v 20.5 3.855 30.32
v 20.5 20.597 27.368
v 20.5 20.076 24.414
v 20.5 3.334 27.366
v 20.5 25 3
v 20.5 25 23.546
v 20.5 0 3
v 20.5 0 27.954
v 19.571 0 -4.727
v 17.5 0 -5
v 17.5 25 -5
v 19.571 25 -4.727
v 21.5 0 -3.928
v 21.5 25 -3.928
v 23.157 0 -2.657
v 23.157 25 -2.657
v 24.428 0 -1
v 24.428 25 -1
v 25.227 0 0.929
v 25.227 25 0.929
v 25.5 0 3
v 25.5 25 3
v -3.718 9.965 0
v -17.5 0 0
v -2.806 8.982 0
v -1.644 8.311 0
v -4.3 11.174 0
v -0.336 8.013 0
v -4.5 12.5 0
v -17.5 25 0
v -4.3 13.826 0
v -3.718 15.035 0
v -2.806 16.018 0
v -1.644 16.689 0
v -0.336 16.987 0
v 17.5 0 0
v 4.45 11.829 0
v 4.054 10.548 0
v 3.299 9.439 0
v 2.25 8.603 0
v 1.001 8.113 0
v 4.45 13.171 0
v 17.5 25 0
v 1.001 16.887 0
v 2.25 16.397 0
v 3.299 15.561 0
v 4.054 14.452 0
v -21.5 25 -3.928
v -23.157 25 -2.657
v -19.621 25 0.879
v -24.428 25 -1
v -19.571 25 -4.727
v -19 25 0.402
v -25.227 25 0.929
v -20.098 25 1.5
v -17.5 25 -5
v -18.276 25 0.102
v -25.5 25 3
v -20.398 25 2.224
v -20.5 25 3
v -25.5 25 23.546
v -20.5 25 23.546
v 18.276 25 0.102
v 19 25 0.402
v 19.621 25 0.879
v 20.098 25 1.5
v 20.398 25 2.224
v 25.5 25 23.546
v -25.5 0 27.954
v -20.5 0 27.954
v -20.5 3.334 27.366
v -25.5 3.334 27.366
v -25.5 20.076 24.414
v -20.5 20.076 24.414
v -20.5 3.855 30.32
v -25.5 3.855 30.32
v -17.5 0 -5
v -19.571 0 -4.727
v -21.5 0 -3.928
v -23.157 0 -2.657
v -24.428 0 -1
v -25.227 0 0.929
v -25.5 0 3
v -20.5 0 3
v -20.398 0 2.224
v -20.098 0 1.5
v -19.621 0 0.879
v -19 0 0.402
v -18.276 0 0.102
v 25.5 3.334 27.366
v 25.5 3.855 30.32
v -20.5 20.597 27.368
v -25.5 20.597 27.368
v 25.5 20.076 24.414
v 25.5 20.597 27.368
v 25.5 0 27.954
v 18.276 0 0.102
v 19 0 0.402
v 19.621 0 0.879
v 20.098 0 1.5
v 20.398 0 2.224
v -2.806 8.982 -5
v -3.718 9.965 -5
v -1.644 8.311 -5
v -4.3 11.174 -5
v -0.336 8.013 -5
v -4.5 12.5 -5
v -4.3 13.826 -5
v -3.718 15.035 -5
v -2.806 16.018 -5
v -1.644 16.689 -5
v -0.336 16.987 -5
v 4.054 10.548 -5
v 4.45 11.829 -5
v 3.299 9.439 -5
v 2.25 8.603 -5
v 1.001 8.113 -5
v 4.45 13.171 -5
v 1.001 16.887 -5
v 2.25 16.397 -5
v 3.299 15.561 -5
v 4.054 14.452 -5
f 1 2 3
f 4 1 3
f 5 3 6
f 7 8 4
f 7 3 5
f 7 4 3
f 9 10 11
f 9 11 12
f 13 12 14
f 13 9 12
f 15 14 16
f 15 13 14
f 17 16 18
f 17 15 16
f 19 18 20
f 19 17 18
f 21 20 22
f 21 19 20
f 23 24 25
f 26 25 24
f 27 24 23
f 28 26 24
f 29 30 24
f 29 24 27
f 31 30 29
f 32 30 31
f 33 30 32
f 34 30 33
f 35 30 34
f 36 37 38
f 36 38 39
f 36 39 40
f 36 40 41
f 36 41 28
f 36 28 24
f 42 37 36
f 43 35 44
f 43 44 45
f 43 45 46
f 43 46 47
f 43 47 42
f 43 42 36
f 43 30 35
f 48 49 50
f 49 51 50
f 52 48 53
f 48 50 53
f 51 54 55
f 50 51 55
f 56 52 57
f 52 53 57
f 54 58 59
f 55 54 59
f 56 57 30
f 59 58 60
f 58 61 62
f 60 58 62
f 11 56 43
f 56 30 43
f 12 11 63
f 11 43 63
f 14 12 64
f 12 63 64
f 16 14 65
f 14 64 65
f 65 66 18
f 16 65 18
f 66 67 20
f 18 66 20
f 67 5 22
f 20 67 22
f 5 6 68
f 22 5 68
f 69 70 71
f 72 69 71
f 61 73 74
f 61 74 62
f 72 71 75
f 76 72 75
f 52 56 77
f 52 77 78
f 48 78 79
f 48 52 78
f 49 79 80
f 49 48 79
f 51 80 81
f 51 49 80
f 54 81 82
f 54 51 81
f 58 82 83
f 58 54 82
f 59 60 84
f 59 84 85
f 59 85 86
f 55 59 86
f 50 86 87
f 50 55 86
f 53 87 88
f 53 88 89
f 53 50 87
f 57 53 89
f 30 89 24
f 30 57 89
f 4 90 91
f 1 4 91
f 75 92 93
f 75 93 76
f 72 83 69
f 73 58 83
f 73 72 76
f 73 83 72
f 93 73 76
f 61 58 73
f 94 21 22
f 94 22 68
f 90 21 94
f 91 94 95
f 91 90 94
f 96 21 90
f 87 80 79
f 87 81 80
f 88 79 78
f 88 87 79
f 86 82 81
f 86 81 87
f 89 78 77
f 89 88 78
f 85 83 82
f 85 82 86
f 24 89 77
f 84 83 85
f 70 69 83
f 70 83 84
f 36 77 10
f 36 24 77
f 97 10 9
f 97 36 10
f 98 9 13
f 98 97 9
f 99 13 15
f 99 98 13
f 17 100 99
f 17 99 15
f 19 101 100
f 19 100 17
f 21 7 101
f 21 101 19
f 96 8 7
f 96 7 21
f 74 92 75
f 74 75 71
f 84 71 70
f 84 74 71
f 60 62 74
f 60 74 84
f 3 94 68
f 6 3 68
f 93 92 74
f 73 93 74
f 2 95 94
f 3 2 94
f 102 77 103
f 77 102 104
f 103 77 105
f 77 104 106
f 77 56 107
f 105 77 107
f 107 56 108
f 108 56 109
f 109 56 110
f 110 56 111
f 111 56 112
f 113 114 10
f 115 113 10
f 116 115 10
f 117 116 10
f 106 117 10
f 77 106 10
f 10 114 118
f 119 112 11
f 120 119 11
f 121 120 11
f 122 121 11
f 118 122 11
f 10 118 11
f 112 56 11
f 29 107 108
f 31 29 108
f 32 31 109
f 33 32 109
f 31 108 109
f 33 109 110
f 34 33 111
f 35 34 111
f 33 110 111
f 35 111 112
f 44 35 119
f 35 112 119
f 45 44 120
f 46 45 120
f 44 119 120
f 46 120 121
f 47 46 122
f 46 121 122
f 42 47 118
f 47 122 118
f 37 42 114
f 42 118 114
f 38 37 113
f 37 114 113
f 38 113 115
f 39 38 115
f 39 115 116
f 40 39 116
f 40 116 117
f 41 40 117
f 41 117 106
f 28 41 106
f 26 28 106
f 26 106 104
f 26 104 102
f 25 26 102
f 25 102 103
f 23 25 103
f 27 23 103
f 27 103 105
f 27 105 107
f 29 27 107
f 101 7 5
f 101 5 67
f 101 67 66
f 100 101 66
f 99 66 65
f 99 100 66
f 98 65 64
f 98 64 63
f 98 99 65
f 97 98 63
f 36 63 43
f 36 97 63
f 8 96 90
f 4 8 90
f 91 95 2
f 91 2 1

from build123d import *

# Parameters (mm, degrees)
SKETCH_1_W             = 35
SKETCH_1_H             = 25
SM_BASE_FLANGE_1_DEPTH = 5
SM_EDGE_FLANGE_1_DEPTH = 25
SM_EDGE_FLANGE_2_DEPTH = 25
CUT_EXTRUDE_1_DEPTH    = 65.707032075
CUT_EXTRUDE_3_DEPTH    = 65.707032075
SKETCH_35_R            = 4.5
CUT_EXTRUDE_2_DEPTH    = 51.227169575


# Sheet-metal steps are written as plain solids
with BuildPart() as part:
    # Sketch 1 → Базовая кромка1 (new body)
    with BuildSketch(Plane.XY):
        with Locations((0, 12.5)):
            Rectangle(SKETCH_1_W, SKETCH_1_H)
    extrude(amount=-SM_BASE_FLANGE_1_DEPTH)

    # Ребро-кромка1 section (across the edge) → Ребро-кромка1 (add)
    with BuildSketch(Plane(origin=(-20.5, 25, 0), x_dir=(1, 0, 0), z_dir=(0, -1, 0))):
        with BuildLine():
            Line((-5, 3), (-5, 31))
            Line((-5, 31), (0, 31))
            Line((0, 31), (0, 3))
            ThreePointArc((0, 3), (0.878679656, 0.878679656), (3, 0))
            Line((3, 0), (3, -5))
            ThreePointArc((3, -5), (-2.656854249, -2.656854249), (-5, 3))
        make_face()
    extrude(amount=SM_EDGE_FLANGE_1_DEPTH)

    # Ребро-кромка2 section (across the edge) → Ребро-кромка2 (add)
    with BuildSketch(Plane(origin=(20.5, 0, 0), x_dir=(-1, 0, 0), z_dir=(0, 1, 0))):
        with BuildLine():
            Line((-5, 3), (-5, 31))
            Line((-5, 31), (0, 31))
            Line((0, 31), (0, 3))
            ThreePointArc((0, 3), (0.878679656, 0.878679656), (3, 0))
            Line((3, 0), (3, -5))
            ThreePointArc((3, -5), (-2.656854249, -2.656854249), (-5, 3))
        make_face()
    extrude(amount=SM_EDGE_FLANGE_2_DEPTH)

    # Эскиз33 → Вырез-Вытянуть1 (cut, through all)
    with BuildSketch(Plane(origin=(25.5, 0, 0), x_dir=(0, 0, -1), z_dir=(1, 0, 0))):
        Polygon((-31, 0), (-31, 25), (-26.591825482, 25), align=None)
    extrude(amount=-CUT_EXTRUDE_1_DEPTH, mode=Mode.SUBTRACT)

    # Эскиз36 → Вырез-Вытянуть3 (cut, through all)
    with BuildSketch(Plane(origin=(25.5, 0, 0), x_dir=(0, 0, -1), z_dir=(1, 0, 0))):
        Polygon((-26.591825482, 25), (-27.368209794, 20.596905768), (-24.413786535, 20.075961235), (-23.545545647, 25), align=None)
        Polygon((-27.365805555, 3.334229434), (-30.320228814, 3.855173967), (-31, 0), (-27.953720164, 0), align=None)
    extrude(amount=-CUT_EXTRUDE_3_DEPTH, mode=Mode.SUBTRACT)

    # Эскиз35 → Вырез-Вытянуть2 (cut, through all)
    with BuildSketch(Plane(origin=(0, 0, -5), x_dir=(-1, 0, 0), z_dir=(0, 0, -1))):
        with Locations((0, 12.5)):
            Circle(SKETCH_35_R)
    extrude(amount=-CUT_EXTRUDE_2_DEPTH, mode=Mode.SUBTRACT)


solid = part.part
